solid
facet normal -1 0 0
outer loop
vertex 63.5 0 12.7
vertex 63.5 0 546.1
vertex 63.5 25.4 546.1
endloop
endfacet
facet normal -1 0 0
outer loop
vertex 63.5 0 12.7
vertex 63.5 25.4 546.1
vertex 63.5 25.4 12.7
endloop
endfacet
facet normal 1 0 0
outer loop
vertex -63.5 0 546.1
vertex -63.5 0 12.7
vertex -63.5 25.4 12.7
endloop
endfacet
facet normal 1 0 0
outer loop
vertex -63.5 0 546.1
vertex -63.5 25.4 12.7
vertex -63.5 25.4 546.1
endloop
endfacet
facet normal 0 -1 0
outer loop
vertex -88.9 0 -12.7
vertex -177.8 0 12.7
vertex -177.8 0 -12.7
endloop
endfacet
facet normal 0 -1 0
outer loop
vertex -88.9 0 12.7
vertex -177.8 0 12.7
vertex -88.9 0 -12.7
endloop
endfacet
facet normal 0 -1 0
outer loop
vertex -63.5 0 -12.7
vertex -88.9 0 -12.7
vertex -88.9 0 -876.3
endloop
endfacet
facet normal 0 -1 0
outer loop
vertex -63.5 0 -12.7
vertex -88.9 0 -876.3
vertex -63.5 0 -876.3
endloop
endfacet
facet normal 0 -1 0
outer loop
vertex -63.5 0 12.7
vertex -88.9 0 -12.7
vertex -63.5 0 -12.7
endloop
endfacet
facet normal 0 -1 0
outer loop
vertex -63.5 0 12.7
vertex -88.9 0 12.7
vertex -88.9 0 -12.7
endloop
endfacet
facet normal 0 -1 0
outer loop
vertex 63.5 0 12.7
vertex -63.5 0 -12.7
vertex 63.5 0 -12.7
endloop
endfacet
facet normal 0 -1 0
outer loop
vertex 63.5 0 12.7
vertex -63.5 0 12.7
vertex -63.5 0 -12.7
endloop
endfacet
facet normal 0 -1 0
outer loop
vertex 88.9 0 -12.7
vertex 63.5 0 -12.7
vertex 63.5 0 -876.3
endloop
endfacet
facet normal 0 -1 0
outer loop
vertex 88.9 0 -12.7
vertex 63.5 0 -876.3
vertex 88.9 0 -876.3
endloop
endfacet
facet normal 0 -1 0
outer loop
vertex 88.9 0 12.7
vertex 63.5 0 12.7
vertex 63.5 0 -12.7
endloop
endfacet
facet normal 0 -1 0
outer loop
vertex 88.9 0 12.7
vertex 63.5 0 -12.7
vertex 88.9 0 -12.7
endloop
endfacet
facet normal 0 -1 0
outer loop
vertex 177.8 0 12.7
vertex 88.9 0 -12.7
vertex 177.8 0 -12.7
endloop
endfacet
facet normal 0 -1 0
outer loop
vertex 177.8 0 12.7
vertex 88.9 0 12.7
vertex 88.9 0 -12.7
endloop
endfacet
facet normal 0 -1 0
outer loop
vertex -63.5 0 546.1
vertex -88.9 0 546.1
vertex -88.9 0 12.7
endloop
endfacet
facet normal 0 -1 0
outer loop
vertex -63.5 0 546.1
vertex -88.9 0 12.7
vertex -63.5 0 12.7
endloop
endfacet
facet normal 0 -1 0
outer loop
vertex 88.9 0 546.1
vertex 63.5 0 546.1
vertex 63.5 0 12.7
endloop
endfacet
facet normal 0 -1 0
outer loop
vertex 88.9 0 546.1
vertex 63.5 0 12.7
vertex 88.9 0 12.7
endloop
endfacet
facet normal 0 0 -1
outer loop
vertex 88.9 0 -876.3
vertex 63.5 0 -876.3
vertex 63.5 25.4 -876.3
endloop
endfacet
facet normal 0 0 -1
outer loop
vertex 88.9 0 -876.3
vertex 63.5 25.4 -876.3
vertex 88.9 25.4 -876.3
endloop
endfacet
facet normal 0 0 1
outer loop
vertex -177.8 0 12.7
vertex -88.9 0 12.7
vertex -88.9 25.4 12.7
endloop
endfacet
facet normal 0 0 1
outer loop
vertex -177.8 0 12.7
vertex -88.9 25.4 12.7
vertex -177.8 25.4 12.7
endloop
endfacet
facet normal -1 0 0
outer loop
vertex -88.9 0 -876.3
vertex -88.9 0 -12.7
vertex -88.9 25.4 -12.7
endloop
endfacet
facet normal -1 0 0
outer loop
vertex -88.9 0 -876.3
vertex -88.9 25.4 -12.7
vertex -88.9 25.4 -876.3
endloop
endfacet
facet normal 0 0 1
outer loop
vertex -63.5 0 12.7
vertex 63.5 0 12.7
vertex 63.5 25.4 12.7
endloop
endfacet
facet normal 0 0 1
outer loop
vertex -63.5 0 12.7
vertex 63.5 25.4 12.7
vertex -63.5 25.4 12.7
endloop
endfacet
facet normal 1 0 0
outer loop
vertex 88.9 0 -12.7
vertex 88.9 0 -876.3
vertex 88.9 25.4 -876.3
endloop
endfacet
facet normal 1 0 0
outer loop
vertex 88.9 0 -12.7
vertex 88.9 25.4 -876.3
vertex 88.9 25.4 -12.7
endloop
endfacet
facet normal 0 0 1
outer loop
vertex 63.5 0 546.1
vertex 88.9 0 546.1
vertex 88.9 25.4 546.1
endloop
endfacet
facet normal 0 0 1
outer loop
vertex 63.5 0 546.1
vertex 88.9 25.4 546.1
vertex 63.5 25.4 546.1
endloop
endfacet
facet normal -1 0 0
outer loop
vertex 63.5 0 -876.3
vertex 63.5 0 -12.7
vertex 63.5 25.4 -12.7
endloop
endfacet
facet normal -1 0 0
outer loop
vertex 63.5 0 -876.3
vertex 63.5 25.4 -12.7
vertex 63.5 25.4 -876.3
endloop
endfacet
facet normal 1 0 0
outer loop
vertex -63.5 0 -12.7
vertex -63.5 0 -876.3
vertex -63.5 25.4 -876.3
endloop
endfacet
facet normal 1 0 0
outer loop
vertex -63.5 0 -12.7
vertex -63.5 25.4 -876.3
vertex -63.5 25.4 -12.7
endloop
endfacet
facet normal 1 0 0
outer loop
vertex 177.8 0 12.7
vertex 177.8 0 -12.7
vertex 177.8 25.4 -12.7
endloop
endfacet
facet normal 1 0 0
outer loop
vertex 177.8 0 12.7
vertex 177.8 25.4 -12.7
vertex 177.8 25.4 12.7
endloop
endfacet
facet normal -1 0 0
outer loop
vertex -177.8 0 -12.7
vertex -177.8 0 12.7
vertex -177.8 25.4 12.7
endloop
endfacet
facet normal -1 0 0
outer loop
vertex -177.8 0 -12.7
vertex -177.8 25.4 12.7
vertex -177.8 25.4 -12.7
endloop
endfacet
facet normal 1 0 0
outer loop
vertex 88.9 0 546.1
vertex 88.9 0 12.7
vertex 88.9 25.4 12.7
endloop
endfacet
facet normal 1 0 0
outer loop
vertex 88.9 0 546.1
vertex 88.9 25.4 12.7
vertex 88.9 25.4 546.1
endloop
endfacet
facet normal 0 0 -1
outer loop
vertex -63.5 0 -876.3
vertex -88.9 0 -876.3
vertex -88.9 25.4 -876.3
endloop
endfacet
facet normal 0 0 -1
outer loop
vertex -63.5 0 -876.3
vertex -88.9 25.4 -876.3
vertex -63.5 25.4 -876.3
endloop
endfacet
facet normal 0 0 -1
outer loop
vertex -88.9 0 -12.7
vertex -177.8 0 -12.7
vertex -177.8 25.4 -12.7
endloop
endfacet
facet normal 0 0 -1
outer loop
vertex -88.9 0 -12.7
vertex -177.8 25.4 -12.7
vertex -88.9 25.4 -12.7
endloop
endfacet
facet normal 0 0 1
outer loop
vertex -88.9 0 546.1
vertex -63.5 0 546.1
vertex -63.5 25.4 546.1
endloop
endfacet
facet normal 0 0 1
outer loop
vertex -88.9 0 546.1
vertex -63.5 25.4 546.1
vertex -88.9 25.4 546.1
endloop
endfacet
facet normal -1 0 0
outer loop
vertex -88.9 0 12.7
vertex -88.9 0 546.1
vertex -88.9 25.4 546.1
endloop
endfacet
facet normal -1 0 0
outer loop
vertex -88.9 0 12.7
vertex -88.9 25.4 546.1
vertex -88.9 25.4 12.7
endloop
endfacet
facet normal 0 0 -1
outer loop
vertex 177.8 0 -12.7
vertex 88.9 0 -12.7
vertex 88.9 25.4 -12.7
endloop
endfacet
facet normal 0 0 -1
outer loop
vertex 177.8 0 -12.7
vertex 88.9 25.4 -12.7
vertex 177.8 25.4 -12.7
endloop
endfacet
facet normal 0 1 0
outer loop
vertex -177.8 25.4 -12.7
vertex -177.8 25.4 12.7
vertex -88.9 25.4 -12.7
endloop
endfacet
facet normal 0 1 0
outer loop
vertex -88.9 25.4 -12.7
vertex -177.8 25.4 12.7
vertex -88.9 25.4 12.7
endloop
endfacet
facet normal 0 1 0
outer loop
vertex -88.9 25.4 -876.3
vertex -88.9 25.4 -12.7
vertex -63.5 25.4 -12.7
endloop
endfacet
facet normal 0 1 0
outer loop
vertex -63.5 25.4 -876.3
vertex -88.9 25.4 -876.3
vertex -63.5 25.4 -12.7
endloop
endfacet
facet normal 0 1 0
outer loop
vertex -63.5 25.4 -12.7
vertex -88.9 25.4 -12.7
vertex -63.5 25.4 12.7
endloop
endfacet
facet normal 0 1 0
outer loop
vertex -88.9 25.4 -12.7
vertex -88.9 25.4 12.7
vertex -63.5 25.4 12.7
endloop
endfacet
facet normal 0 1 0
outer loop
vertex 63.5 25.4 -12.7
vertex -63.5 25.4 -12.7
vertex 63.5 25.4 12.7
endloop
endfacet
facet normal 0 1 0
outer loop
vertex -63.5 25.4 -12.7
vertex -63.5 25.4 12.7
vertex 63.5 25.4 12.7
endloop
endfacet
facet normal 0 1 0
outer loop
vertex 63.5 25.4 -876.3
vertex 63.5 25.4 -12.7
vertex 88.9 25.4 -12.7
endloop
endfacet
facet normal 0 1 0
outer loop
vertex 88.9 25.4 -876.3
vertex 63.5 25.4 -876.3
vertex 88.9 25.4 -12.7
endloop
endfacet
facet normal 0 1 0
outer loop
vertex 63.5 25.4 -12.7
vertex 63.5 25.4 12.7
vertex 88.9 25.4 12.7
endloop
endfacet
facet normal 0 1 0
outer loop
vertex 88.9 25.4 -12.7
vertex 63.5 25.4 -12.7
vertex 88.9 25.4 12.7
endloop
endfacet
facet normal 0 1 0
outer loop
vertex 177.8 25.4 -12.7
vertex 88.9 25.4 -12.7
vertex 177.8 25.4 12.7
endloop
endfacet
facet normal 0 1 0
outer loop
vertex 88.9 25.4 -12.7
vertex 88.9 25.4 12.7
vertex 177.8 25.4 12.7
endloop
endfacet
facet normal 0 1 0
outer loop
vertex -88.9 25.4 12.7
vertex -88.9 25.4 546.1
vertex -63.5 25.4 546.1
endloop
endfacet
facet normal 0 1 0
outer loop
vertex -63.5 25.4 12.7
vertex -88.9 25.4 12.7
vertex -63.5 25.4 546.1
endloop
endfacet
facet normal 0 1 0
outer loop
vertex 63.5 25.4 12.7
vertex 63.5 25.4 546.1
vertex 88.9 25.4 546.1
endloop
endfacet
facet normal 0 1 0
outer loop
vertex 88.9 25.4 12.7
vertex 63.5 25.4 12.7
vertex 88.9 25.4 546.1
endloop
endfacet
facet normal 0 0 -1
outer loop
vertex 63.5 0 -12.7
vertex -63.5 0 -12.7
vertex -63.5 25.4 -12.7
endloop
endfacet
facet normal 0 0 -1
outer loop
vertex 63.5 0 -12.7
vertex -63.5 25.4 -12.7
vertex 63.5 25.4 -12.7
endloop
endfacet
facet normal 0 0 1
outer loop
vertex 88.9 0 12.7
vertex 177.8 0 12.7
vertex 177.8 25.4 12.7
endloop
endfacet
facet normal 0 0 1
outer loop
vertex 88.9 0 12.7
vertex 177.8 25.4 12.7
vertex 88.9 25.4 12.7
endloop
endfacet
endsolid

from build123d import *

# Parameters (mm, degrees)
F1_DEPTH = 25.4


with BuildPart() as f1:
    # F0 (on Front) → F1 (new body)
    with BuildSketch(Plane.XZ):
        Polygon((-63.5, 546.1), (-88.9, 546.1), (-88.9, 12.7), (-177.8, 12.7), (-177.8, -12.7), (-88.9, -12.7), (-88.9, -876.3), (-63.5, -876.3), (-63.5, -12.7), (63.5, -12.7), (63.5, -876.3), (88.9, -876.3), (88.9, -12.7), (177.8, -12.7), (177.8, 12.7), (88.9, 12.7), (88.9, 546.1), (63.5, 546.1), (63.5, 12.7), (-63.5, 12.7), align=None)
    extrude(amount=-F1_DEPTH)


solid = f1.part
